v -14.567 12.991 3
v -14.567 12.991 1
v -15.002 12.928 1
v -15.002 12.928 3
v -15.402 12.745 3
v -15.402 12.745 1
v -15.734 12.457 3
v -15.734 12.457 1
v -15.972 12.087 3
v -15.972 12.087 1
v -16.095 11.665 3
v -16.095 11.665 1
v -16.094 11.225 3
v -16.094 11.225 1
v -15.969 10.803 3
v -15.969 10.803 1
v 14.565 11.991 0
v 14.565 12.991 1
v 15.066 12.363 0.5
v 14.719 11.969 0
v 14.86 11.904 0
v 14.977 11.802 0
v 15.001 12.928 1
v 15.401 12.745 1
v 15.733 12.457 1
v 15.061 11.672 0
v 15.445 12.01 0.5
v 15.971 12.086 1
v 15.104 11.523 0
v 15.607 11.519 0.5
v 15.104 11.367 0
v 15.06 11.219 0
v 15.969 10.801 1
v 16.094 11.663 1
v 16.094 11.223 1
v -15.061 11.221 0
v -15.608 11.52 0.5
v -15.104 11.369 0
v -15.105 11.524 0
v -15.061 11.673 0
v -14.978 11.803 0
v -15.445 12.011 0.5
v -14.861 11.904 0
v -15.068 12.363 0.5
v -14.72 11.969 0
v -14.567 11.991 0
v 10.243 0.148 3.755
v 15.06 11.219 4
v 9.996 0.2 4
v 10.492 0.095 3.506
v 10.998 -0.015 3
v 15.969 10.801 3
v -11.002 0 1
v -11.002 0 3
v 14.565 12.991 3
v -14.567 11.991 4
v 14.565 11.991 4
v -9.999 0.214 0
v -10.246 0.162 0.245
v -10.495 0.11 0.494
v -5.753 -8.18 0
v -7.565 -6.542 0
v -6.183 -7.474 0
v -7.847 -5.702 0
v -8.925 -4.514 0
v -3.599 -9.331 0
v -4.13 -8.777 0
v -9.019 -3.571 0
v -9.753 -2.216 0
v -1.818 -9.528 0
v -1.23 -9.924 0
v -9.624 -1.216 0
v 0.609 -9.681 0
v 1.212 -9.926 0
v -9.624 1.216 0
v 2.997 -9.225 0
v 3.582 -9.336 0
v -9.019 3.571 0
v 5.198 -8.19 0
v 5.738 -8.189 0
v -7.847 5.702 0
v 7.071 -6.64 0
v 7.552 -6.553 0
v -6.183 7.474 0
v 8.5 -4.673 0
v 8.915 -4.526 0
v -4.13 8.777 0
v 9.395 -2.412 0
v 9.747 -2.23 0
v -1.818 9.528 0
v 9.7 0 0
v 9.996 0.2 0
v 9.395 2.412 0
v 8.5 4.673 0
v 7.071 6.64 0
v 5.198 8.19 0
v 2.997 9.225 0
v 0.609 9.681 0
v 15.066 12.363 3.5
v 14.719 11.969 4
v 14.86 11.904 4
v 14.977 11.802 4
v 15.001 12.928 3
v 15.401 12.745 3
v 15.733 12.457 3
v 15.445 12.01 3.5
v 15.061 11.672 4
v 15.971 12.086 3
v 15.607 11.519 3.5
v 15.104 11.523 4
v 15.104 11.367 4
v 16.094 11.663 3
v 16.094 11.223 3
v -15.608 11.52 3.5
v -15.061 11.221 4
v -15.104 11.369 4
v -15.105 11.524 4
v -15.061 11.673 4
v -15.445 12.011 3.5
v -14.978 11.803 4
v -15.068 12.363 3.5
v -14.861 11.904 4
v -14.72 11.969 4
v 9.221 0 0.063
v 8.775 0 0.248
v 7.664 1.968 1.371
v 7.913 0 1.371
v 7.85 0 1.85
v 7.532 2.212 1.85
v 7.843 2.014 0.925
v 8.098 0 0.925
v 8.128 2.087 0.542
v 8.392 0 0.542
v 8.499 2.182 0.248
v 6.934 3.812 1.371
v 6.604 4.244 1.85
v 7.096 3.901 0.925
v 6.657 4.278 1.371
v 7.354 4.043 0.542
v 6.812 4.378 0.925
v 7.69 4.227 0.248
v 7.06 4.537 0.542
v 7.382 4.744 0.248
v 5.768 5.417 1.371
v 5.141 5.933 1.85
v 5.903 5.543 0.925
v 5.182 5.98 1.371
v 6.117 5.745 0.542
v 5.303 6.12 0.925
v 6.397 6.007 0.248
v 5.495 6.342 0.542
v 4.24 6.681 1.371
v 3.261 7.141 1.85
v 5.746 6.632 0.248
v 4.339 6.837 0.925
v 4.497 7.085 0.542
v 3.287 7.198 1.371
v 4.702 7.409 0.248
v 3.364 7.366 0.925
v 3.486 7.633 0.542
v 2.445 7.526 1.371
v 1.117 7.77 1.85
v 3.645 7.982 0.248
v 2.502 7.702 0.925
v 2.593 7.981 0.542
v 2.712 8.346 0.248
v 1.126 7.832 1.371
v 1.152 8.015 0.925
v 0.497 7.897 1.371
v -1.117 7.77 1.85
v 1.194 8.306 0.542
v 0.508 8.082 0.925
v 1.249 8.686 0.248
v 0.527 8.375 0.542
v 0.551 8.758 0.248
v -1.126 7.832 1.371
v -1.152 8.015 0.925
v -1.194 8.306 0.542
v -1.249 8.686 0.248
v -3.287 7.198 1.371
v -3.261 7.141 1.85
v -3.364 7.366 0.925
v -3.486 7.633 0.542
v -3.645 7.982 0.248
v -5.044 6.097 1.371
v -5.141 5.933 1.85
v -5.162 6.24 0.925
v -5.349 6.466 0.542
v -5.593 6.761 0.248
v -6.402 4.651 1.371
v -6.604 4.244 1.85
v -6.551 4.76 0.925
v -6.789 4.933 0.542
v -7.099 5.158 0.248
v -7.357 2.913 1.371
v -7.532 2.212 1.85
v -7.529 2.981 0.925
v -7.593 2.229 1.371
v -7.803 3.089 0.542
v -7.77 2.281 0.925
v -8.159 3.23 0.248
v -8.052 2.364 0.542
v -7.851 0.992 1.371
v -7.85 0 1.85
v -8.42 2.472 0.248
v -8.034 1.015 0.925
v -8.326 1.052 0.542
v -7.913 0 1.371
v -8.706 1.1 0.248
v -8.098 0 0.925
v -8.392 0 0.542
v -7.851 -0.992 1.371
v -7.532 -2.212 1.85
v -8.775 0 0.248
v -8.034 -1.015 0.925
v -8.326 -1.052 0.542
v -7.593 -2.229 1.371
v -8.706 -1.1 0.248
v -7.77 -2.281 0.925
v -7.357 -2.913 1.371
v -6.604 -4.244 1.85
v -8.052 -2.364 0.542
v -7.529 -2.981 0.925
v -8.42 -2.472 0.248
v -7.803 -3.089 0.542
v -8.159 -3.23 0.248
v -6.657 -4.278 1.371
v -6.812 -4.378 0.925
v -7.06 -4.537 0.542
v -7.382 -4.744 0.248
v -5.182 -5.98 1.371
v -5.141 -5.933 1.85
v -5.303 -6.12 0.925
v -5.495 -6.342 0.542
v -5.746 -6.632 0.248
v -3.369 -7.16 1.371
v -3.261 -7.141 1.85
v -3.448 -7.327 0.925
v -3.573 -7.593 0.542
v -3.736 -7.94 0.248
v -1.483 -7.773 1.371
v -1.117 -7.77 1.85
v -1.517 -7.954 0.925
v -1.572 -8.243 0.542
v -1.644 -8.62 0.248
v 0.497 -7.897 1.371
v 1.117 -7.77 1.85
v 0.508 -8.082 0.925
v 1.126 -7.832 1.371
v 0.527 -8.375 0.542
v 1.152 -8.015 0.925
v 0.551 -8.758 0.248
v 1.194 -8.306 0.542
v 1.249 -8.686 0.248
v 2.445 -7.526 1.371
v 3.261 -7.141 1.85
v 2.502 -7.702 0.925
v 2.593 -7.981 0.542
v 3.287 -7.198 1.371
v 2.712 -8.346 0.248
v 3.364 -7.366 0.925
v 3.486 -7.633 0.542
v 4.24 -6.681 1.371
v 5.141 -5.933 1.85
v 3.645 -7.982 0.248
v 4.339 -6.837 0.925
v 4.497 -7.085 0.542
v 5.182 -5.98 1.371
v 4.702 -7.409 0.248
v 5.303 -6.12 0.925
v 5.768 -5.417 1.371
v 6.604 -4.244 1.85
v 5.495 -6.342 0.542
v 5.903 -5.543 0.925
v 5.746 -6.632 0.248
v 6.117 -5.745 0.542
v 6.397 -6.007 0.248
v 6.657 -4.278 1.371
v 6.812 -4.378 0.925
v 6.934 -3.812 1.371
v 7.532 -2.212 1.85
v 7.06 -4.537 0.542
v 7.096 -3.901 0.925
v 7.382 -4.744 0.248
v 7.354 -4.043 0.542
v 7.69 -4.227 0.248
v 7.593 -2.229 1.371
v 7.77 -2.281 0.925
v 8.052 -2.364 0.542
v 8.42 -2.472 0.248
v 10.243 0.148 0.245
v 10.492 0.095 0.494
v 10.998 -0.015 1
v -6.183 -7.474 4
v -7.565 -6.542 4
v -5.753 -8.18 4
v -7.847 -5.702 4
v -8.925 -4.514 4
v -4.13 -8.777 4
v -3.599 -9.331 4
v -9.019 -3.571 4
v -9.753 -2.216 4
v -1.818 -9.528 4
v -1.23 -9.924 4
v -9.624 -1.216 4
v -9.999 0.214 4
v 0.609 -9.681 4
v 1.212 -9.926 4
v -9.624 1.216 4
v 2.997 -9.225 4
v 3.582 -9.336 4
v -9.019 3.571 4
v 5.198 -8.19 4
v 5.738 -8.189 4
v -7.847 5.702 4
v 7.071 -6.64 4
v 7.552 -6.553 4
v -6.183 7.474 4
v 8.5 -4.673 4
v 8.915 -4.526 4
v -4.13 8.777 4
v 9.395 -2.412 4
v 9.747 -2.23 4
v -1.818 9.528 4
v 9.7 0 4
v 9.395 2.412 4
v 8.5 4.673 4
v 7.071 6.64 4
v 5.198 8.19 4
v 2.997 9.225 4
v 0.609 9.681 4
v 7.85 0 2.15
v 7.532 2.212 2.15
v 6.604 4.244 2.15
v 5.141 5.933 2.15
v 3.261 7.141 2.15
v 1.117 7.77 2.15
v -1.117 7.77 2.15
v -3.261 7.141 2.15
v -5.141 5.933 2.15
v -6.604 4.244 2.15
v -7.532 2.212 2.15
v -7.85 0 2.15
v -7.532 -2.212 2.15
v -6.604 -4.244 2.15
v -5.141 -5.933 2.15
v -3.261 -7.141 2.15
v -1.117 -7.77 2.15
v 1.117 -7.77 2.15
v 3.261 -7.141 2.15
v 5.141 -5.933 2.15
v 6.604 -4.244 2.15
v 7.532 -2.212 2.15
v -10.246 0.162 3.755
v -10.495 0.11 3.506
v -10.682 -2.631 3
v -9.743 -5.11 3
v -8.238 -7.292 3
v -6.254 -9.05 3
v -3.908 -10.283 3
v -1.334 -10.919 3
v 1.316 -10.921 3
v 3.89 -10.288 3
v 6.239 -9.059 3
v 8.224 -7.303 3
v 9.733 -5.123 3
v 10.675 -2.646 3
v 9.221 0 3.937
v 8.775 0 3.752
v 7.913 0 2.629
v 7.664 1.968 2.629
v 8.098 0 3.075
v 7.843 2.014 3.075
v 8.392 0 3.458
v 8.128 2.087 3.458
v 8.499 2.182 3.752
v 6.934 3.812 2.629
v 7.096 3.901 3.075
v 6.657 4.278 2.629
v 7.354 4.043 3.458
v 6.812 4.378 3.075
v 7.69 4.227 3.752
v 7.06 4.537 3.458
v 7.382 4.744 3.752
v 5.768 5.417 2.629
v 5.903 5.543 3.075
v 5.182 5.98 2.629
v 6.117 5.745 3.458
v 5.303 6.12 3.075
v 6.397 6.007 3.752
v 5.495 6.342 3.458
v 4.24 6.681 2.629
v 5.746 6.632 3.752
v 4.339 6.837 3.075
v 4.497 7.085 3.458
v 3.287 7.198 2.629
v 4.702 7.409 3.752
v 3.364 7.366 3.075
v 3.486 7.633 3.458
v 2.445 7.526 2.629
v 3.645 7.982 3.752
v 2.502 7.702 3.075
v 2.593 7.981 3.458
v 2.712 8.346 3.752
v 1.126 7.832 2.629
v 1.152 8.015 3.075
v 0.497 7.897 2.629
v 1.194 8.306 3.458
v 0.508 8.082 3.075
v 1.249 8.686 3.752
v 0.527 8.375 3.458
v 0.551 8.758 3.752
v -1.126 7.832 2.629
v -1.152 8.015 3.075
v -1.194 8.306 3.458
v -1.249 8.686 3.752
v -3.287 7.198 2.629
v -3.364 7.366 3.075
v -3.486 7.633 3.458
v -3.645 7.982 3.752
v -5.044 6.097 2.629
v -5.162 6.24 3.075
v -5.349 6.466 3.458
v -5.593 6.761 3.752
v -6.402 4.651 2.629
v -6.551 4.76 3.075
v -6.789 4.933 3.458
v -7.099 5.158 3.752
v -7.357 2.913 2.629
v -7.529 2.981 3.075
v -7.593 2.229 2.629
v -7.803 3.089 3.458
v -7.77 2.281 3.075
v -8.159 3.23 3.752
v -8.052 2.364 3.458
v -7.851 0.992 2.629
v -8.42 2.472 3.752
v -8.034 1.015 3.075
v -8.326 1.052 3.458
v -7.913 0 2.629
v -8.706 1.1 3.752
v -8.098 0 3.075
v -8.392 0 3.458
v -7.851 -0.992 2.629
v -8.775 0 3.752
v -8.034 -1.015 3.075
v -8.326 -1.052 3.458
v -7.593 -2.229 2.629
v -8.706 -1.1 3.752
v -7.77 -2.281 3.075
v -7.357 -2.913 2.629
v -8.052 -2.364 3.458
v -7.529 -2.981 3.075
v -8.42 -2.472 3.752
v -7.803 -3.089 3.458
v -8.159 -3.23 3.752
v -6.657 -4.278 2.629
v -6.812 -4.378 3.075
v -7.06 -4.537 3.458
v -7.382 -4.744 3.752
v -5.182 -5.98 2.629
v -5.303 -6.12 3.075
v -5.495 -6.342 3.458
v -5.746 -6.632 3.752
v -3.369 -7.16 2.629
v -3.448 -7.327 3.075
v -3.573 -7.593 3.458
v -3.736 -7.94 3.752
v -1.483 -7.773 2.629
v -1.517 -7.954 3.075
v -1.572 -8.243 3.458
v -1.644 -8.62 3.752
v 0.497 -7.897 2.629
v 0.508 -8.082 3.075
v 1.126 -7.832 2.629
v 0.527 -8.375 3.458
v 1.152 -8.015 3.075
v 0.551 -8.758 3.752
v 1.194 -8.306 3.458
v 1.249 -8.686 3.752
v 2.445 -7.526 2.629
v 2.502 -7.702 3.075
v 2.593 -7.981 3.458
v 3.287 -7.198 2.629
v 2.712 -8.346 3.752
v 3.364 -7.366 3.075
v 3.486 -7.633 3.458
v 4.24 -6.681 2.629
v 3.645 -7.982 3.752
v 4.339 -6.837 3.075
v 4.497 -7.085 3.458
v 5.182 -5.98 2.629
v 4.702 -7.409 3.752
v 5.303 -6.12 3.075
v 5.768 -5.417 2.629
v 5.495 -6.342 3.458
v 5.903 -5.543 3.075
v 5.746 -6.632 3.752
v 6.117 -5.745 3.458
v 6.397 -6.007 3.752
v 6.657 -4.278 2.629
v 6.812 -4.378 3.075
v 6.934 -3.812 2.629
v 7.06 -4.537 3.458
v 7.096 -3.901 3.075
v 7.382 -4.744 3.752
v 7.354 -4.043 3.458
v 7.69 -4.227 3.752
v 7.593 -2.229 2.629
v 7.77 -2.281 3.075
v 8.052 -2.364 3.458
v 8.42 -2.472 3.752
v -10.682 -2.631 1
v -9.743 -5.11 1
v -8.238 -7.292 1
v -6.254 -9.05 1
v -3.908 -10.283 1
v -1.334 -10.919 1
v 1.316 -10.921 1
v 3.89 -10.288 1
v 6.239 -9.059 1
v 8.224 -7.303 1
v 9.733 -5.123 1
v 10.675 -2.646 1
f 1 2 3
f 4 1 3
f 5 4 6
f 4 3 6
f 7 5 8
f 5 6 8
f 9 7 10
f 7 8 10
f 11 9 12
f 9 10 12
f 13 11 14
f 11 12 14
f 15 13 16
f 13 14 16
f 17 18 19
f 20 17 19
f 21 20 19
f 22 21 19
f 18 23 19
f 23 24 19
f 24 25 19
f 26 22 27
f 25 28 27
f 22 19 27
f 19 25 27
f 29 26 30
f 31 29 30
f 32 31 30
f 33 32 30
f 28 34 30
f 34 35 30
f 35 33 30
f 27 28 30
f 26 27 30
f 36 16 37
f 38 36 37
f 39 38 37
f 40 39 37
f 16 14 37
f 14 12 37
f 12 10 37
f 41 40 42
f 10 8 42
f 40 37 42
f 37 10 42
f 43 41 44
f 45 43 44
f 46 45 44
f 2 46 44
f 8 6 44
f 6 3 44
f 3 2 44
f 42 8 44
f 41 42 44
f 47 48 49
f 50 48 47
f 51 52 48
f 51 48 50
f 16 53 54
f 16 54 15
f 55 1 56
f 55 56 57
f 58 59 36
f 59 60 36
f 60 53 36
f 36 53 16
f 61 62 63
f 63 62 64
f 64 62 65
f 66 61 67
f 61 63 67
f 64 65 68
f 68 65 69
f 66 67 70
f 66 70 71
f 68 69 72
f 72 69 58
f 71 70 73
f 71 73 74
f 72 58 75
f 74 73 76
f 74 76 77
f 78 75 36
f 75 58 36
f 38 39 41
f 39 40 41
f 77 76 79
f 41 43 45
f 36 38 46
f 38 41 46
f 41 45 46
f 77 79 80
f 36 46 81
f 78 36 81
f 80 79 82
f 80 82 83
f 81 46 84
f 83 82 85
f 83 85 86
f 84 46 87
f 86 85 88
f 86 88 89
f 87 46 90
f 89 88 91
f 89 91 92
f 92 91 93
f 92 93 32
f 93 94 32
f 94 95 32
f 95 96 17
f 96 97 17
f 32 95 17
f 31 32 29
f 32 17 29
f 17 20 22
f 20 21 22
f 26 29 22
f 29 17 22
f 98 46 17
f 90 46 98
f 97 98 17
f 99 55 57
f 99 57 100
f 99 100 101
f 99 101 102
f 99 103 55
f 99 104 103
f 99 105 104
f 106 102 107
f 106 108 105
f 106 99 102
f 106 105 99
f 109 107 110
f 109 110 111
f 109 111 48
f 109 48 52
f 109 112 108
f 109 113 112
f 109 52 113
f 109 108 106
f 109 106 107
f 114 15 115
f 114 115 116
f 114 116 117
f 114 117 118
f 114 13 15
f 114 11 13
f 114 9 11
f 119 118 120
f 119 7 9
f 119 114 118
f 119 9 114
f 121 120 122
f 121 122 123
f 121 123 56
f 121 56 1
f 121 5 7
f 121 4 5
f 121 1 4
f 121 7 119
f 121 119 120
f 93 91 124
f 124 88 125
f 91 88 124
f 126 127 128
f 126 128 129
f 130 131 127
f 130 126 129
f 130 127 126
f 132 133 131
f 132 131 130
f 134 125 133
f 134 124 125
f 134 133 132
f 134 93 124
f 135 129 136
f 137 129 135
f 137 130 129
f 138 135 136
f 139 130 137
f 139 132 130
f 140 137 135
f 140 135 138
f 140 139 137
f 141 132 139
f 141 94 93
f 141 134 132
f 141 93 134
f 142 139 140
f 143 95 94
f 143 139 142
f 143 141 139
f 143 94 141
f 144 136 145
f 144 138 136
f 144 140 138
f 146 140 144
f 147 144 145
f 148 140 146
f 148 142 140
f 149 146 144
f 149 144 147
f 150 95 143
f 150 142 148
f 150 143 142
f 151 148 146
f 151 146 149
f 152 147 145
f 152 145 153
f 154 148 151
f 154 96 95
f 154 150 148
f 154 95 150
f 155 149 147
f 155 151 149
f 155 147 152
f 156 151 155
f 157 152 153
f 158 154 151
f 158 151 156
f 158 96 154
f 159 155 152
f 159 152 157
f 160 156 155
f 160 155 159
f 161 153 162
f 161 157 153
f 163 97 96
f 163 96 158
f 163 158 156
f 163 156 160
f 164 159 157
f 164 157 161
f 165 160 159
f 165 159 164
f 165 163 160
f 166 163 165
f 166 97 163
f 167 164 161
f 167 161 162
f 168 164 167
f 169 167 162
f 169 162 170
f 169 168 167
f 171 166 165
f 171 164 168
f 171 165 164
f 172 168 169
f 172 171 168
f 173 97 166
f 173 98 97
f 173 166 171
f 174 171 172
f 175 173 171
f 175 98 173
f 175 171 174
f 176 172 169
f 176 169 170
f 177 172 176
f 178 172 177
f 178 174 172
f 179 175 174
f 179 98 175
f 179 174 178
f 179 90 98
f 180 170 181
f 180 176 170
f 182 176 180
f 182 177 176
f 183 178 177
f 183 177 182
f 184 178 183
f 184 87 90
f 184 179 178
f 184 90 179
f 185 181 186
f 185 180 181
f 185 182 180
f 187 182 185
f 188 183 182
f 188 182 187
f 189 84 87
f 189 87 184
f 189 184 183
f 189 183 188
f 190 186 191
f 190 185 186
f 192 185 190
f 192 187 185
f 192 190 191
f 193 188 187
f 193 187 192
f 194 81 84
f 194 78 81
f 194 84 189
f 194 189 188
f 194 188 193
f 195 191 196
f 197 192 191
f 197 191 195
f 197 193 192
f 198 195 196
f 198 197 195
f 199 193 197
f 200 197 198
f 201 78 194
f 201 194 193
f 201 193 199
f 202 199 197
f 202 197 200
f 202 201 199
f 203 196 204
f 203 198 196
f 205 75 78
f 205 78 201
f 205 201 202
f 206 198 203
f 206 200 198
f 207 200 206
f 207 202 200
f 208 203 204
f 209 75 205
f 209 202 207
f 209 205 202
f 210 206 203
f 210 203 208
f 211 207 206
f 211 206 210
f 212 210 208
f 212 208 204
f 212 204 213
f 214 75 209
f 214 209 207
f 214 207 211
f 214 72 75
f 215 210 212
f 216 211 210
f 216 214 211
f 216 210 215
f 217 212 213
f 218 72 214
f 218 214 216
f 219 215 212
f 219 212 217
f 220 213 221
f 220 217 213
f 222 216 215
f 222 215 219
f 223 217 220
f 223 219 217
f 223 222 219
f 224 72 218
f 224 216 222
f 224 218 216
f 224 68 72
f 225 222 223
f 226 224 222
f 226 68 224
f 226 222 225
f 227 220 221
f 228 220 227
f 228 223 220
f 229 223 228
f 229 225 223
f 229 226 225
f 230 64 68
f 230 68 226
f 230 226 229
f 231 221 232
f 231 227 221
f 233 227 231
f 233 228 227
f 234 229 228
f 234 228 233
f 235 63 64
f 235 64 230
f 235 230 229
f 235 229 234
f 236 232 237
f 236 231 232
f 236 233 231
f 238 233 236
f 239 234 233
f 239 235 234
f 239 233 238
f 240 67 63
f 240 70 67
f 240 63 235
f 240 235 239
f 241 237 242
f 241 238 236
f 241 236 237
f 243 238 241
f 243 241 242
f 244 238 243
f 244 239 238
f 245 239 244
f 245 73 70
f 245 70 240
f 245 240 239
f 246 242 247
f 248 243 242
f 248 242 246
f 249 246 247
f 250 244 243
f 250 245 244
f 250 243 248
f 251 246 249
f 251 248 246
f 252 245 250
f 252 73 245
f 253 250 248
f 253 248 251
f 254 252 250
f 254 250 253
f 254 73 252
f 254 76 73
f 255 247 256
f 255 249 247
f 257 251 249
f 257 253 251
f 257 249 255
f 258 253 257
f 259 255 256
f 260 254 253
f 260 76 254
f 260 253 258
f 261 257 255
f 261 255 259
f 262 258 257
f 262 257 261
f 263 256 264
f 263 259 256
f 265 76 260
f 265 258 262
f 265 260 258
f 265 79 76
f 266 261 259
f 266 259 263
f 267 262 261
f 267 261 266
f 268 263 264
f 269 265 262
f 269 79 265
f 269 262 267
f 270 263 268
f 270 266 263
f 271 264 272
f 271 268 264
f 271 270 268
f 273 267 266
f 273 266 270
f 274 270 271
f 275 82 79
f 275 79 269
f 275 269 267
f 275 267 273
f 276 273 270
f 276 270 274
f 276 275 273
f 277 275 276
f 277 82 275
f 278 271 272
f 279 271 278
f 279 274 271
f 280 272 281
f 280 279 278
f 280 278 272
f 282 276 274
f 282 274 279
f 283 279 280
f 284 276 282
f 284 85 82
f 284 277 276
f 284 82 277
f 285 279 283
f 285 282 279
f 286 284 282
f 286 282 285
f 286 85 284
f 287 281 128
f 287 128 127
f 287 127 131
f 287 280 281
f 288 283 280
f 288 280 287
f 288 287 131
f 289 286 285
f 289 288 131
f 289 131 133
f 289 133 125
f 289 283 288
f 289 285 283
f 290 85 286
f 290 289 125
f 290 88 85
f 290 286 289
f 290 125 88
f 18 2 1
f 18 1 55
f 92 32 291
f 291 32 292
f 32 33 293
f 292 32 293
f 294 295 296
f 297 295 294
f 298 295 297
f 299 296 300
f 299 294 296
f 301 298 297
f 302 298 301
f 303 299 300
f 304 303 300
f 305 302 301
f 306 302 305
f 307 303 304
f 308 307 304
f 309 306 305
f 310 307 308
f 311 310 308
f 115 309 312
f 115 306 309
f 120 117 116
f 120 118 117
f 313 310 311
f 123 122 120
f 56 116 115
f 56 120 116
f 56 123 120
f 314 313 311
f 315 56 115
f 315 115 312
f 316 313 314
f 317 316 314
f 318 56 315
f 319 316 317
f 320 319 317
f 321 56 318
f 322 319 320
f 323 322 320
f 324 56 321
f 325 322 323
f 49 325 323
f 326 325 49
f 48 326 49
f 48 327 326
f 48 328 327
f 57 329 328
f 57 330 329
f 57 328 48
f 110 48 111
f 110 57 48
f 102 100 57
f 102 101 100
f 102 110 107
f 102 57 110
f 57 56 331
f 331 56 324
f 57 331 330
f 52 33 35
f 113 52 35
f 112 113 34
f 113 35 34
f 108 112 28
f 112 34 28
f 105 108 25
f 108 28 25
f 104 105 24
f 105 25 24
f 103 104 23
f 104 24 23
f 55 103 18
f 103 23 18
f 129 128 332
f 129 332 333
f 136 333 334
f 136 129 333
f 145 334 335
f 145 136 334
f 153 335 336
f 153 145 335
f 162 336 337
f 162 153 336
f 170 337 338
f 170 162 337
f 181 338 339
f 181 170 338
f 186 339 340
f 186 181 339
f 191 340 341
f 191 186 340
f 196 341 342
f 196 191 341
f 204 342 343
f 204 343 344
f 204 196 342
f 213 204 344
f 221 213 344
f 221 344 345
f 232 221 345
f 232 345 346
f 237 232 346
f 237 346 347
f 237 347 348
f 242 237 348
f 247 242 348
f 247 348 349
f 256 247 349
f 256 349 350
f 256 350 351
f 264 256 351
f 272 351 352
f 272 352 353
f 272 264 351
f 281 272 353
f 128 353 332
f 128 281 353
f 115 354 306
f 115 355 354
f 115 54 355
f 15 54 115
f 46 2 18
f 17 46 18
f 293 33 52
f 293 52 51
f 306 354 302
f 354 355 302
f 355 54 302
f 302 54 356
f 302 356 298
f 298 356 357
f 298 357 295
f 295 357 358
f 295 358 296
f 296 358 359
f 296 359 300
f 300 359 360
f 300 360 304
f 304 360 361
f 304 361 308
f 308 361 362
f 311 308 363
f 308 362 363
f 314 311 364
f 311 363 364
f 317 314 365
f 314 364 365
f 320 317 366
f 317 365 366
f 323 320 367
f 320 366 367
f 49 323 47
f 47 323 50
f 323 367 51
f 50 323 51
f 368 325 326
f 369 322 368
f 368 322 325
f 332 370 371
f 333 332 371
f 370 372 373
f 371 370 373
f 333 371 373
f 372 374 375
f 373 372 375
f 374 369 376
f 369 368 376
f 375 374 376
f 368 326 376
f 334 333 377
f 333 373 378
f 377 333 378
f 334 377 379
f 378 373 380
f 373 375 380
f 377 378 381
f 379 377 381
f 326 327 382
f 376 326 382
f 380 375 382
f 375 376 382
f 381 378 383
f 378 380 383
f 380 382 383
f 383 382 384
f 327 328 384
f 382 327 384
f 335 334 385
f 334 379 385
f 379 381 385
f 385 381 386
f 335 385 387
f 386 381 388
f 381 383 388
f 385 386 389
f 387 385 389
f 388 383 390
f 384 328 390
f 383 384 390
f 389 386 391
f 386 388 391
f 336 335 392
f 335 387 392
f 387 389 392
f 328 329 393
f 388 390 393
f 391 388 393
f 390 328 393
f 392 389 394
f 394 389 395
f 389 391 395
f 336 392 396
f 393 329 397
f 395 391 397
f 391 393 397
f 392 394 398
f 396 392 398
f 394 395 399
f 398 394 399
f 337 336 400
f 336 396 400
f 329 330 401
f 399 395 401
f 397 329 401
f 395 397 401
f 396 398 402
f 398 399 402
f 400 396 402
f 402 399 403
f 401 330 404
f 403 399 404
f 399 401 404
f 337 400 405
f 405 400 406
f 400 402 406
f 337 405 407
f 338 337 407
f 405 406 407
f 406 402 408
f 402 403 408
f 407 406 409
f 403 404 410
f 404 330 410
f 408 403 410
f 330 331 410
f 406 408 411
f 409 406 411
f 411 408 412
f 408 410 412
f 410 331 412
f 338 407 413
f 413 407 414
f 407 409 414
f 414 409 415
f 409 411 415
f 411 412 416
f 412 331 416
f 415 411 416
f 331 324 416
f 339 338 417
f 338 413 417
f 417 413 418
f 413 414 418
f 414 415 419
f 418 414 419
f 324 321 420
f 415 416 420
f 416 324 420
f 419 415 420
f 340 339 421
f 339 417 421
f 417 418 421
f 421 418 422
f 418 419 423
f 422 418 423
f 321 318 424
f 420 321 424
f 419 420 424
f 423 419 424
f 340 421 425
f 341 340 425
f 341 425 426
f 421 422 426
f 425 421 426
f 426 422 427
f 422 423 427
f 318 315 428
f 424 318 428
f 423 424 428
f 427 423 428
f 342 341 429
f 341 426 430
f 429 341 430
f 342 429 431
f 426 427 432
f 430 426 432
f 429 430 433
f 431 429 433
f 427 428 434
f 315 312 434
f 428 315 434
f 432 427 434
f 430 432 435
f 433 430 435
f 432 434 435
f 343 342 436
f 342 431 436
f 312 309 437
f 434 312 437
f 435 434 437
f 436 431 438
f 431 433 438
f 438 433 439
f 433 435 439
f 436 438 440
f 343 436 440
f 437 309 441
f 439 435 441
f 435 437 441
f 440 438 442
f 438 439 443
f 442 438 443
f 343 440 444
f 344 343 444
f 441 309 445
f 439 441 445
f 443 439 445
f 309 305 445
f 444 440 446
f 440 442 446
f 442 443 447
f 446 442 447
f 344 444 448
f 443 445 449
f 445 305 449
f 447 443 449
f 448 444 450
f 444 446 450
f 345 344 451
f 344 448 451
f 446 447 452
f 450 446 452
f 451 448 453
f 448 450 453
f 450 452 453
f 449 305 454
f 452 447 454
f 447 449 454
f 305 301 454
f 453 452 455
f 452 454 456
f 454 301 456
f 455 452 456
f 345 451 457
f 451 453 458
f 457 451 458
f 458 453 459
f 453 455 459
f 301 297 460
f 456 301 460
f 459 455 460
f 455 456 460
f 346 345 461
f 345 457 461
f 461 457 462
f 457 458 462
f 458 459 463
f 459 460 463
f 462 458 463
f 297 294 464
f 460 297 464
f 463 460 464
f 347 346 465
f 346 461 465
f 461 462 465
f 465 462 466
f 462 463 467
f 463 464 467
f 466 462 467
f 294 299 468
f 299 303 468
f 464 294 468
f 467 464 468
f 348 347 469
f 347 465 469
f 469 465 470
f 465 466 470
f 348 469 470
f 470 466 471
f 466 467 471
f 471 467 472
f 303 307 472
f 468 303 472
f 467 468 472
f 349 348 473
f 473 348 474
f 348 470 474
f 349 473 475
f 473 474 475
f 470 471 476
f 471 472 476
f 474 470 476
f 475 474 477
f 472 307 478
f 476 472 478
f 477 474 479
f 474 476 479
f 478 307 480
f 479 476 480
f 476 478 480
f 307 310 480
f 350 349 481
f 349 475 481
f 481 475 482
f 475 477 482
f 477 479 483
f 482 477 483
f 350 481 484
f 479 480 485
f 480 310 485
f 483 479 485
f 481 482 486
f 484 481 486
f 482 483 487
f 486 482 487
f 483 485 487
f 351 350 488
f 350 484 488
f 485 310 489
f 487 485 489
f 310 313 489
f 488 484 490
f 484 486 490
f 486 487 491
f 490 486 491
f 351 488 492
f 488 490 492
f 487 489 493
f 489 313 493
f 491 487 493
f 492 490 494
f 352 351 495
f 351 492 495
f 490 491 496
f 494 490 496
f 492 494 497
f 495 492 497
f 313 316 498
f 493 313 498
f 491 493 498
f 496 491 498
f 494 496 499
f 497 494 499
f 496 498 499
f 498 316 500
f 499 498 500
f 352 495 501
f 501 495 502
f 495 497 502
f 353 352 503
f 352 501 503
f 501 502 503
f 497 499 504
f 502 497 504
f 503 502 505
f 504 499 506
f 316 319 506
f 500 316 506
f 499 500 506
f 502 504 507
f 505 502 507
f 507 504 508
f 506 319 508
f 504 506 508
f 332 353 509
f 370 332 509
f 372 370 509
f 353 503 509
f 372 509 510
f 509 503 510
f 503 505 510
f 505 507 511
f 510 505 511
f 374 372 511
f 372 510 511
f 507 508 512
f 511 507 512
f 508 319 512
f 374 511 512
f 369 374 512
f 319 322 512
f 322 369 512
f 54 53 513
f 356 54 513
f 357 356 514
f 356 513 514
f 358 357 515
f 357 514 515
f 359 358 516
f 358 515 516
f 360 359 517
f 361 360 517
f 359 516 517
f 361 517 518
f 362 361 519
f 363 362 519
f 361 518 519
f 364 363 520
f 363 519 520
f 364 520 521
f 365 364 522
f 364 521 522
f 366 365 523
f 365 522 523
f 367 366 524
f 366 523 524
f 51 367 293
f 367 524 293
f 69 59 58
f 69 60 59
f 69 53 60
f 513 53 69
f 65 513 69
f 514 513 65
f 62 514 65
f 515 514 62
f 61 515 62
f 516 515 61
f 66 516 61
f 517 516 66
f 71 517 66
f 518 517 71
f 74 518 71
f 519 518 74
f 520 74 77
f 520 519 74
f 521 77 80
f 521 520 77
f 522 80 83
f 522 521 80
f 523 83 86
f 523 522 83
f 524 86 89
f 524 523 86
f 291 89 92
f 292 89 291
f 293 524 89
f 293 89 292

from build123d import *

# Parameters (mm, degrees)
SKETCH_R     = 7.85
PAD_DEPTH    = 4
FILLET_R     = 1.85
CHAMFER_SIZE = 1


with BuildPart() as part:
    # Sketch → Pad (new body)
    with BuildSketch(Plane.XY):
        with BuildLine():
            ThreePointArc((-11.001607, 0), (-0.009069, -10.999997), (10.998383, -0.014925))
            Line((15.968624, 10.800985), (10.998383, -0.014925))
            ThreePointArc((15.968624, 10.800985), (15.865486, 12.279709), (14.564905, 12.990872))
            Line((-14.567237, 12.990872), (14.564905, 12.990872))
            ThreePointArc((-14.567237, 12.990872), (-15.866325, 12.280427), (-15.969093, 10.803336))
            Line((-11.001607, 0), (-15.969093, 10.803336))
        make_face()
        Circle(SKETCH_R, mode=Mode.SUBTRACT)
    extrude(amount=PAD_DEPTH)

    # Fillet
    fillet_edges = [part.edges().sort_by_distance(p)[0] for p in [
        (-7.85, 0, 4),
        (-7.85, 0, 0),
    ]]
    fillet(fillet_edges, radius=FILLET_R)

    # Chamfer
    chamfer_edges = [part.edges().sort_by_distance(p)[0] for p in [
        (15.968624, 10.800985, 2),
        (13.483504, 5.39303, 4),
        (15.865486, 12.279709, 4),
        (-0.001166, 12.990872, 4),
        (-15.866325, 12.280427, 4),
        (-13.48535, 5.401668, 4),
        (-0.009069, -10.999997, 4),
        (-9.7, 0, 4),
        (-0.009069, -10.999997, 0),
        (13.483504, 5.39303, 0),
        (15.865486, 12.279709, 0),
        (-0.001166, 12.990872, 0),
        (-13.48535, 5.401668, 0),
    ]]
    chamfer(chamfer_edges, length=CHAMFER_SIZE)


solid = part.part
